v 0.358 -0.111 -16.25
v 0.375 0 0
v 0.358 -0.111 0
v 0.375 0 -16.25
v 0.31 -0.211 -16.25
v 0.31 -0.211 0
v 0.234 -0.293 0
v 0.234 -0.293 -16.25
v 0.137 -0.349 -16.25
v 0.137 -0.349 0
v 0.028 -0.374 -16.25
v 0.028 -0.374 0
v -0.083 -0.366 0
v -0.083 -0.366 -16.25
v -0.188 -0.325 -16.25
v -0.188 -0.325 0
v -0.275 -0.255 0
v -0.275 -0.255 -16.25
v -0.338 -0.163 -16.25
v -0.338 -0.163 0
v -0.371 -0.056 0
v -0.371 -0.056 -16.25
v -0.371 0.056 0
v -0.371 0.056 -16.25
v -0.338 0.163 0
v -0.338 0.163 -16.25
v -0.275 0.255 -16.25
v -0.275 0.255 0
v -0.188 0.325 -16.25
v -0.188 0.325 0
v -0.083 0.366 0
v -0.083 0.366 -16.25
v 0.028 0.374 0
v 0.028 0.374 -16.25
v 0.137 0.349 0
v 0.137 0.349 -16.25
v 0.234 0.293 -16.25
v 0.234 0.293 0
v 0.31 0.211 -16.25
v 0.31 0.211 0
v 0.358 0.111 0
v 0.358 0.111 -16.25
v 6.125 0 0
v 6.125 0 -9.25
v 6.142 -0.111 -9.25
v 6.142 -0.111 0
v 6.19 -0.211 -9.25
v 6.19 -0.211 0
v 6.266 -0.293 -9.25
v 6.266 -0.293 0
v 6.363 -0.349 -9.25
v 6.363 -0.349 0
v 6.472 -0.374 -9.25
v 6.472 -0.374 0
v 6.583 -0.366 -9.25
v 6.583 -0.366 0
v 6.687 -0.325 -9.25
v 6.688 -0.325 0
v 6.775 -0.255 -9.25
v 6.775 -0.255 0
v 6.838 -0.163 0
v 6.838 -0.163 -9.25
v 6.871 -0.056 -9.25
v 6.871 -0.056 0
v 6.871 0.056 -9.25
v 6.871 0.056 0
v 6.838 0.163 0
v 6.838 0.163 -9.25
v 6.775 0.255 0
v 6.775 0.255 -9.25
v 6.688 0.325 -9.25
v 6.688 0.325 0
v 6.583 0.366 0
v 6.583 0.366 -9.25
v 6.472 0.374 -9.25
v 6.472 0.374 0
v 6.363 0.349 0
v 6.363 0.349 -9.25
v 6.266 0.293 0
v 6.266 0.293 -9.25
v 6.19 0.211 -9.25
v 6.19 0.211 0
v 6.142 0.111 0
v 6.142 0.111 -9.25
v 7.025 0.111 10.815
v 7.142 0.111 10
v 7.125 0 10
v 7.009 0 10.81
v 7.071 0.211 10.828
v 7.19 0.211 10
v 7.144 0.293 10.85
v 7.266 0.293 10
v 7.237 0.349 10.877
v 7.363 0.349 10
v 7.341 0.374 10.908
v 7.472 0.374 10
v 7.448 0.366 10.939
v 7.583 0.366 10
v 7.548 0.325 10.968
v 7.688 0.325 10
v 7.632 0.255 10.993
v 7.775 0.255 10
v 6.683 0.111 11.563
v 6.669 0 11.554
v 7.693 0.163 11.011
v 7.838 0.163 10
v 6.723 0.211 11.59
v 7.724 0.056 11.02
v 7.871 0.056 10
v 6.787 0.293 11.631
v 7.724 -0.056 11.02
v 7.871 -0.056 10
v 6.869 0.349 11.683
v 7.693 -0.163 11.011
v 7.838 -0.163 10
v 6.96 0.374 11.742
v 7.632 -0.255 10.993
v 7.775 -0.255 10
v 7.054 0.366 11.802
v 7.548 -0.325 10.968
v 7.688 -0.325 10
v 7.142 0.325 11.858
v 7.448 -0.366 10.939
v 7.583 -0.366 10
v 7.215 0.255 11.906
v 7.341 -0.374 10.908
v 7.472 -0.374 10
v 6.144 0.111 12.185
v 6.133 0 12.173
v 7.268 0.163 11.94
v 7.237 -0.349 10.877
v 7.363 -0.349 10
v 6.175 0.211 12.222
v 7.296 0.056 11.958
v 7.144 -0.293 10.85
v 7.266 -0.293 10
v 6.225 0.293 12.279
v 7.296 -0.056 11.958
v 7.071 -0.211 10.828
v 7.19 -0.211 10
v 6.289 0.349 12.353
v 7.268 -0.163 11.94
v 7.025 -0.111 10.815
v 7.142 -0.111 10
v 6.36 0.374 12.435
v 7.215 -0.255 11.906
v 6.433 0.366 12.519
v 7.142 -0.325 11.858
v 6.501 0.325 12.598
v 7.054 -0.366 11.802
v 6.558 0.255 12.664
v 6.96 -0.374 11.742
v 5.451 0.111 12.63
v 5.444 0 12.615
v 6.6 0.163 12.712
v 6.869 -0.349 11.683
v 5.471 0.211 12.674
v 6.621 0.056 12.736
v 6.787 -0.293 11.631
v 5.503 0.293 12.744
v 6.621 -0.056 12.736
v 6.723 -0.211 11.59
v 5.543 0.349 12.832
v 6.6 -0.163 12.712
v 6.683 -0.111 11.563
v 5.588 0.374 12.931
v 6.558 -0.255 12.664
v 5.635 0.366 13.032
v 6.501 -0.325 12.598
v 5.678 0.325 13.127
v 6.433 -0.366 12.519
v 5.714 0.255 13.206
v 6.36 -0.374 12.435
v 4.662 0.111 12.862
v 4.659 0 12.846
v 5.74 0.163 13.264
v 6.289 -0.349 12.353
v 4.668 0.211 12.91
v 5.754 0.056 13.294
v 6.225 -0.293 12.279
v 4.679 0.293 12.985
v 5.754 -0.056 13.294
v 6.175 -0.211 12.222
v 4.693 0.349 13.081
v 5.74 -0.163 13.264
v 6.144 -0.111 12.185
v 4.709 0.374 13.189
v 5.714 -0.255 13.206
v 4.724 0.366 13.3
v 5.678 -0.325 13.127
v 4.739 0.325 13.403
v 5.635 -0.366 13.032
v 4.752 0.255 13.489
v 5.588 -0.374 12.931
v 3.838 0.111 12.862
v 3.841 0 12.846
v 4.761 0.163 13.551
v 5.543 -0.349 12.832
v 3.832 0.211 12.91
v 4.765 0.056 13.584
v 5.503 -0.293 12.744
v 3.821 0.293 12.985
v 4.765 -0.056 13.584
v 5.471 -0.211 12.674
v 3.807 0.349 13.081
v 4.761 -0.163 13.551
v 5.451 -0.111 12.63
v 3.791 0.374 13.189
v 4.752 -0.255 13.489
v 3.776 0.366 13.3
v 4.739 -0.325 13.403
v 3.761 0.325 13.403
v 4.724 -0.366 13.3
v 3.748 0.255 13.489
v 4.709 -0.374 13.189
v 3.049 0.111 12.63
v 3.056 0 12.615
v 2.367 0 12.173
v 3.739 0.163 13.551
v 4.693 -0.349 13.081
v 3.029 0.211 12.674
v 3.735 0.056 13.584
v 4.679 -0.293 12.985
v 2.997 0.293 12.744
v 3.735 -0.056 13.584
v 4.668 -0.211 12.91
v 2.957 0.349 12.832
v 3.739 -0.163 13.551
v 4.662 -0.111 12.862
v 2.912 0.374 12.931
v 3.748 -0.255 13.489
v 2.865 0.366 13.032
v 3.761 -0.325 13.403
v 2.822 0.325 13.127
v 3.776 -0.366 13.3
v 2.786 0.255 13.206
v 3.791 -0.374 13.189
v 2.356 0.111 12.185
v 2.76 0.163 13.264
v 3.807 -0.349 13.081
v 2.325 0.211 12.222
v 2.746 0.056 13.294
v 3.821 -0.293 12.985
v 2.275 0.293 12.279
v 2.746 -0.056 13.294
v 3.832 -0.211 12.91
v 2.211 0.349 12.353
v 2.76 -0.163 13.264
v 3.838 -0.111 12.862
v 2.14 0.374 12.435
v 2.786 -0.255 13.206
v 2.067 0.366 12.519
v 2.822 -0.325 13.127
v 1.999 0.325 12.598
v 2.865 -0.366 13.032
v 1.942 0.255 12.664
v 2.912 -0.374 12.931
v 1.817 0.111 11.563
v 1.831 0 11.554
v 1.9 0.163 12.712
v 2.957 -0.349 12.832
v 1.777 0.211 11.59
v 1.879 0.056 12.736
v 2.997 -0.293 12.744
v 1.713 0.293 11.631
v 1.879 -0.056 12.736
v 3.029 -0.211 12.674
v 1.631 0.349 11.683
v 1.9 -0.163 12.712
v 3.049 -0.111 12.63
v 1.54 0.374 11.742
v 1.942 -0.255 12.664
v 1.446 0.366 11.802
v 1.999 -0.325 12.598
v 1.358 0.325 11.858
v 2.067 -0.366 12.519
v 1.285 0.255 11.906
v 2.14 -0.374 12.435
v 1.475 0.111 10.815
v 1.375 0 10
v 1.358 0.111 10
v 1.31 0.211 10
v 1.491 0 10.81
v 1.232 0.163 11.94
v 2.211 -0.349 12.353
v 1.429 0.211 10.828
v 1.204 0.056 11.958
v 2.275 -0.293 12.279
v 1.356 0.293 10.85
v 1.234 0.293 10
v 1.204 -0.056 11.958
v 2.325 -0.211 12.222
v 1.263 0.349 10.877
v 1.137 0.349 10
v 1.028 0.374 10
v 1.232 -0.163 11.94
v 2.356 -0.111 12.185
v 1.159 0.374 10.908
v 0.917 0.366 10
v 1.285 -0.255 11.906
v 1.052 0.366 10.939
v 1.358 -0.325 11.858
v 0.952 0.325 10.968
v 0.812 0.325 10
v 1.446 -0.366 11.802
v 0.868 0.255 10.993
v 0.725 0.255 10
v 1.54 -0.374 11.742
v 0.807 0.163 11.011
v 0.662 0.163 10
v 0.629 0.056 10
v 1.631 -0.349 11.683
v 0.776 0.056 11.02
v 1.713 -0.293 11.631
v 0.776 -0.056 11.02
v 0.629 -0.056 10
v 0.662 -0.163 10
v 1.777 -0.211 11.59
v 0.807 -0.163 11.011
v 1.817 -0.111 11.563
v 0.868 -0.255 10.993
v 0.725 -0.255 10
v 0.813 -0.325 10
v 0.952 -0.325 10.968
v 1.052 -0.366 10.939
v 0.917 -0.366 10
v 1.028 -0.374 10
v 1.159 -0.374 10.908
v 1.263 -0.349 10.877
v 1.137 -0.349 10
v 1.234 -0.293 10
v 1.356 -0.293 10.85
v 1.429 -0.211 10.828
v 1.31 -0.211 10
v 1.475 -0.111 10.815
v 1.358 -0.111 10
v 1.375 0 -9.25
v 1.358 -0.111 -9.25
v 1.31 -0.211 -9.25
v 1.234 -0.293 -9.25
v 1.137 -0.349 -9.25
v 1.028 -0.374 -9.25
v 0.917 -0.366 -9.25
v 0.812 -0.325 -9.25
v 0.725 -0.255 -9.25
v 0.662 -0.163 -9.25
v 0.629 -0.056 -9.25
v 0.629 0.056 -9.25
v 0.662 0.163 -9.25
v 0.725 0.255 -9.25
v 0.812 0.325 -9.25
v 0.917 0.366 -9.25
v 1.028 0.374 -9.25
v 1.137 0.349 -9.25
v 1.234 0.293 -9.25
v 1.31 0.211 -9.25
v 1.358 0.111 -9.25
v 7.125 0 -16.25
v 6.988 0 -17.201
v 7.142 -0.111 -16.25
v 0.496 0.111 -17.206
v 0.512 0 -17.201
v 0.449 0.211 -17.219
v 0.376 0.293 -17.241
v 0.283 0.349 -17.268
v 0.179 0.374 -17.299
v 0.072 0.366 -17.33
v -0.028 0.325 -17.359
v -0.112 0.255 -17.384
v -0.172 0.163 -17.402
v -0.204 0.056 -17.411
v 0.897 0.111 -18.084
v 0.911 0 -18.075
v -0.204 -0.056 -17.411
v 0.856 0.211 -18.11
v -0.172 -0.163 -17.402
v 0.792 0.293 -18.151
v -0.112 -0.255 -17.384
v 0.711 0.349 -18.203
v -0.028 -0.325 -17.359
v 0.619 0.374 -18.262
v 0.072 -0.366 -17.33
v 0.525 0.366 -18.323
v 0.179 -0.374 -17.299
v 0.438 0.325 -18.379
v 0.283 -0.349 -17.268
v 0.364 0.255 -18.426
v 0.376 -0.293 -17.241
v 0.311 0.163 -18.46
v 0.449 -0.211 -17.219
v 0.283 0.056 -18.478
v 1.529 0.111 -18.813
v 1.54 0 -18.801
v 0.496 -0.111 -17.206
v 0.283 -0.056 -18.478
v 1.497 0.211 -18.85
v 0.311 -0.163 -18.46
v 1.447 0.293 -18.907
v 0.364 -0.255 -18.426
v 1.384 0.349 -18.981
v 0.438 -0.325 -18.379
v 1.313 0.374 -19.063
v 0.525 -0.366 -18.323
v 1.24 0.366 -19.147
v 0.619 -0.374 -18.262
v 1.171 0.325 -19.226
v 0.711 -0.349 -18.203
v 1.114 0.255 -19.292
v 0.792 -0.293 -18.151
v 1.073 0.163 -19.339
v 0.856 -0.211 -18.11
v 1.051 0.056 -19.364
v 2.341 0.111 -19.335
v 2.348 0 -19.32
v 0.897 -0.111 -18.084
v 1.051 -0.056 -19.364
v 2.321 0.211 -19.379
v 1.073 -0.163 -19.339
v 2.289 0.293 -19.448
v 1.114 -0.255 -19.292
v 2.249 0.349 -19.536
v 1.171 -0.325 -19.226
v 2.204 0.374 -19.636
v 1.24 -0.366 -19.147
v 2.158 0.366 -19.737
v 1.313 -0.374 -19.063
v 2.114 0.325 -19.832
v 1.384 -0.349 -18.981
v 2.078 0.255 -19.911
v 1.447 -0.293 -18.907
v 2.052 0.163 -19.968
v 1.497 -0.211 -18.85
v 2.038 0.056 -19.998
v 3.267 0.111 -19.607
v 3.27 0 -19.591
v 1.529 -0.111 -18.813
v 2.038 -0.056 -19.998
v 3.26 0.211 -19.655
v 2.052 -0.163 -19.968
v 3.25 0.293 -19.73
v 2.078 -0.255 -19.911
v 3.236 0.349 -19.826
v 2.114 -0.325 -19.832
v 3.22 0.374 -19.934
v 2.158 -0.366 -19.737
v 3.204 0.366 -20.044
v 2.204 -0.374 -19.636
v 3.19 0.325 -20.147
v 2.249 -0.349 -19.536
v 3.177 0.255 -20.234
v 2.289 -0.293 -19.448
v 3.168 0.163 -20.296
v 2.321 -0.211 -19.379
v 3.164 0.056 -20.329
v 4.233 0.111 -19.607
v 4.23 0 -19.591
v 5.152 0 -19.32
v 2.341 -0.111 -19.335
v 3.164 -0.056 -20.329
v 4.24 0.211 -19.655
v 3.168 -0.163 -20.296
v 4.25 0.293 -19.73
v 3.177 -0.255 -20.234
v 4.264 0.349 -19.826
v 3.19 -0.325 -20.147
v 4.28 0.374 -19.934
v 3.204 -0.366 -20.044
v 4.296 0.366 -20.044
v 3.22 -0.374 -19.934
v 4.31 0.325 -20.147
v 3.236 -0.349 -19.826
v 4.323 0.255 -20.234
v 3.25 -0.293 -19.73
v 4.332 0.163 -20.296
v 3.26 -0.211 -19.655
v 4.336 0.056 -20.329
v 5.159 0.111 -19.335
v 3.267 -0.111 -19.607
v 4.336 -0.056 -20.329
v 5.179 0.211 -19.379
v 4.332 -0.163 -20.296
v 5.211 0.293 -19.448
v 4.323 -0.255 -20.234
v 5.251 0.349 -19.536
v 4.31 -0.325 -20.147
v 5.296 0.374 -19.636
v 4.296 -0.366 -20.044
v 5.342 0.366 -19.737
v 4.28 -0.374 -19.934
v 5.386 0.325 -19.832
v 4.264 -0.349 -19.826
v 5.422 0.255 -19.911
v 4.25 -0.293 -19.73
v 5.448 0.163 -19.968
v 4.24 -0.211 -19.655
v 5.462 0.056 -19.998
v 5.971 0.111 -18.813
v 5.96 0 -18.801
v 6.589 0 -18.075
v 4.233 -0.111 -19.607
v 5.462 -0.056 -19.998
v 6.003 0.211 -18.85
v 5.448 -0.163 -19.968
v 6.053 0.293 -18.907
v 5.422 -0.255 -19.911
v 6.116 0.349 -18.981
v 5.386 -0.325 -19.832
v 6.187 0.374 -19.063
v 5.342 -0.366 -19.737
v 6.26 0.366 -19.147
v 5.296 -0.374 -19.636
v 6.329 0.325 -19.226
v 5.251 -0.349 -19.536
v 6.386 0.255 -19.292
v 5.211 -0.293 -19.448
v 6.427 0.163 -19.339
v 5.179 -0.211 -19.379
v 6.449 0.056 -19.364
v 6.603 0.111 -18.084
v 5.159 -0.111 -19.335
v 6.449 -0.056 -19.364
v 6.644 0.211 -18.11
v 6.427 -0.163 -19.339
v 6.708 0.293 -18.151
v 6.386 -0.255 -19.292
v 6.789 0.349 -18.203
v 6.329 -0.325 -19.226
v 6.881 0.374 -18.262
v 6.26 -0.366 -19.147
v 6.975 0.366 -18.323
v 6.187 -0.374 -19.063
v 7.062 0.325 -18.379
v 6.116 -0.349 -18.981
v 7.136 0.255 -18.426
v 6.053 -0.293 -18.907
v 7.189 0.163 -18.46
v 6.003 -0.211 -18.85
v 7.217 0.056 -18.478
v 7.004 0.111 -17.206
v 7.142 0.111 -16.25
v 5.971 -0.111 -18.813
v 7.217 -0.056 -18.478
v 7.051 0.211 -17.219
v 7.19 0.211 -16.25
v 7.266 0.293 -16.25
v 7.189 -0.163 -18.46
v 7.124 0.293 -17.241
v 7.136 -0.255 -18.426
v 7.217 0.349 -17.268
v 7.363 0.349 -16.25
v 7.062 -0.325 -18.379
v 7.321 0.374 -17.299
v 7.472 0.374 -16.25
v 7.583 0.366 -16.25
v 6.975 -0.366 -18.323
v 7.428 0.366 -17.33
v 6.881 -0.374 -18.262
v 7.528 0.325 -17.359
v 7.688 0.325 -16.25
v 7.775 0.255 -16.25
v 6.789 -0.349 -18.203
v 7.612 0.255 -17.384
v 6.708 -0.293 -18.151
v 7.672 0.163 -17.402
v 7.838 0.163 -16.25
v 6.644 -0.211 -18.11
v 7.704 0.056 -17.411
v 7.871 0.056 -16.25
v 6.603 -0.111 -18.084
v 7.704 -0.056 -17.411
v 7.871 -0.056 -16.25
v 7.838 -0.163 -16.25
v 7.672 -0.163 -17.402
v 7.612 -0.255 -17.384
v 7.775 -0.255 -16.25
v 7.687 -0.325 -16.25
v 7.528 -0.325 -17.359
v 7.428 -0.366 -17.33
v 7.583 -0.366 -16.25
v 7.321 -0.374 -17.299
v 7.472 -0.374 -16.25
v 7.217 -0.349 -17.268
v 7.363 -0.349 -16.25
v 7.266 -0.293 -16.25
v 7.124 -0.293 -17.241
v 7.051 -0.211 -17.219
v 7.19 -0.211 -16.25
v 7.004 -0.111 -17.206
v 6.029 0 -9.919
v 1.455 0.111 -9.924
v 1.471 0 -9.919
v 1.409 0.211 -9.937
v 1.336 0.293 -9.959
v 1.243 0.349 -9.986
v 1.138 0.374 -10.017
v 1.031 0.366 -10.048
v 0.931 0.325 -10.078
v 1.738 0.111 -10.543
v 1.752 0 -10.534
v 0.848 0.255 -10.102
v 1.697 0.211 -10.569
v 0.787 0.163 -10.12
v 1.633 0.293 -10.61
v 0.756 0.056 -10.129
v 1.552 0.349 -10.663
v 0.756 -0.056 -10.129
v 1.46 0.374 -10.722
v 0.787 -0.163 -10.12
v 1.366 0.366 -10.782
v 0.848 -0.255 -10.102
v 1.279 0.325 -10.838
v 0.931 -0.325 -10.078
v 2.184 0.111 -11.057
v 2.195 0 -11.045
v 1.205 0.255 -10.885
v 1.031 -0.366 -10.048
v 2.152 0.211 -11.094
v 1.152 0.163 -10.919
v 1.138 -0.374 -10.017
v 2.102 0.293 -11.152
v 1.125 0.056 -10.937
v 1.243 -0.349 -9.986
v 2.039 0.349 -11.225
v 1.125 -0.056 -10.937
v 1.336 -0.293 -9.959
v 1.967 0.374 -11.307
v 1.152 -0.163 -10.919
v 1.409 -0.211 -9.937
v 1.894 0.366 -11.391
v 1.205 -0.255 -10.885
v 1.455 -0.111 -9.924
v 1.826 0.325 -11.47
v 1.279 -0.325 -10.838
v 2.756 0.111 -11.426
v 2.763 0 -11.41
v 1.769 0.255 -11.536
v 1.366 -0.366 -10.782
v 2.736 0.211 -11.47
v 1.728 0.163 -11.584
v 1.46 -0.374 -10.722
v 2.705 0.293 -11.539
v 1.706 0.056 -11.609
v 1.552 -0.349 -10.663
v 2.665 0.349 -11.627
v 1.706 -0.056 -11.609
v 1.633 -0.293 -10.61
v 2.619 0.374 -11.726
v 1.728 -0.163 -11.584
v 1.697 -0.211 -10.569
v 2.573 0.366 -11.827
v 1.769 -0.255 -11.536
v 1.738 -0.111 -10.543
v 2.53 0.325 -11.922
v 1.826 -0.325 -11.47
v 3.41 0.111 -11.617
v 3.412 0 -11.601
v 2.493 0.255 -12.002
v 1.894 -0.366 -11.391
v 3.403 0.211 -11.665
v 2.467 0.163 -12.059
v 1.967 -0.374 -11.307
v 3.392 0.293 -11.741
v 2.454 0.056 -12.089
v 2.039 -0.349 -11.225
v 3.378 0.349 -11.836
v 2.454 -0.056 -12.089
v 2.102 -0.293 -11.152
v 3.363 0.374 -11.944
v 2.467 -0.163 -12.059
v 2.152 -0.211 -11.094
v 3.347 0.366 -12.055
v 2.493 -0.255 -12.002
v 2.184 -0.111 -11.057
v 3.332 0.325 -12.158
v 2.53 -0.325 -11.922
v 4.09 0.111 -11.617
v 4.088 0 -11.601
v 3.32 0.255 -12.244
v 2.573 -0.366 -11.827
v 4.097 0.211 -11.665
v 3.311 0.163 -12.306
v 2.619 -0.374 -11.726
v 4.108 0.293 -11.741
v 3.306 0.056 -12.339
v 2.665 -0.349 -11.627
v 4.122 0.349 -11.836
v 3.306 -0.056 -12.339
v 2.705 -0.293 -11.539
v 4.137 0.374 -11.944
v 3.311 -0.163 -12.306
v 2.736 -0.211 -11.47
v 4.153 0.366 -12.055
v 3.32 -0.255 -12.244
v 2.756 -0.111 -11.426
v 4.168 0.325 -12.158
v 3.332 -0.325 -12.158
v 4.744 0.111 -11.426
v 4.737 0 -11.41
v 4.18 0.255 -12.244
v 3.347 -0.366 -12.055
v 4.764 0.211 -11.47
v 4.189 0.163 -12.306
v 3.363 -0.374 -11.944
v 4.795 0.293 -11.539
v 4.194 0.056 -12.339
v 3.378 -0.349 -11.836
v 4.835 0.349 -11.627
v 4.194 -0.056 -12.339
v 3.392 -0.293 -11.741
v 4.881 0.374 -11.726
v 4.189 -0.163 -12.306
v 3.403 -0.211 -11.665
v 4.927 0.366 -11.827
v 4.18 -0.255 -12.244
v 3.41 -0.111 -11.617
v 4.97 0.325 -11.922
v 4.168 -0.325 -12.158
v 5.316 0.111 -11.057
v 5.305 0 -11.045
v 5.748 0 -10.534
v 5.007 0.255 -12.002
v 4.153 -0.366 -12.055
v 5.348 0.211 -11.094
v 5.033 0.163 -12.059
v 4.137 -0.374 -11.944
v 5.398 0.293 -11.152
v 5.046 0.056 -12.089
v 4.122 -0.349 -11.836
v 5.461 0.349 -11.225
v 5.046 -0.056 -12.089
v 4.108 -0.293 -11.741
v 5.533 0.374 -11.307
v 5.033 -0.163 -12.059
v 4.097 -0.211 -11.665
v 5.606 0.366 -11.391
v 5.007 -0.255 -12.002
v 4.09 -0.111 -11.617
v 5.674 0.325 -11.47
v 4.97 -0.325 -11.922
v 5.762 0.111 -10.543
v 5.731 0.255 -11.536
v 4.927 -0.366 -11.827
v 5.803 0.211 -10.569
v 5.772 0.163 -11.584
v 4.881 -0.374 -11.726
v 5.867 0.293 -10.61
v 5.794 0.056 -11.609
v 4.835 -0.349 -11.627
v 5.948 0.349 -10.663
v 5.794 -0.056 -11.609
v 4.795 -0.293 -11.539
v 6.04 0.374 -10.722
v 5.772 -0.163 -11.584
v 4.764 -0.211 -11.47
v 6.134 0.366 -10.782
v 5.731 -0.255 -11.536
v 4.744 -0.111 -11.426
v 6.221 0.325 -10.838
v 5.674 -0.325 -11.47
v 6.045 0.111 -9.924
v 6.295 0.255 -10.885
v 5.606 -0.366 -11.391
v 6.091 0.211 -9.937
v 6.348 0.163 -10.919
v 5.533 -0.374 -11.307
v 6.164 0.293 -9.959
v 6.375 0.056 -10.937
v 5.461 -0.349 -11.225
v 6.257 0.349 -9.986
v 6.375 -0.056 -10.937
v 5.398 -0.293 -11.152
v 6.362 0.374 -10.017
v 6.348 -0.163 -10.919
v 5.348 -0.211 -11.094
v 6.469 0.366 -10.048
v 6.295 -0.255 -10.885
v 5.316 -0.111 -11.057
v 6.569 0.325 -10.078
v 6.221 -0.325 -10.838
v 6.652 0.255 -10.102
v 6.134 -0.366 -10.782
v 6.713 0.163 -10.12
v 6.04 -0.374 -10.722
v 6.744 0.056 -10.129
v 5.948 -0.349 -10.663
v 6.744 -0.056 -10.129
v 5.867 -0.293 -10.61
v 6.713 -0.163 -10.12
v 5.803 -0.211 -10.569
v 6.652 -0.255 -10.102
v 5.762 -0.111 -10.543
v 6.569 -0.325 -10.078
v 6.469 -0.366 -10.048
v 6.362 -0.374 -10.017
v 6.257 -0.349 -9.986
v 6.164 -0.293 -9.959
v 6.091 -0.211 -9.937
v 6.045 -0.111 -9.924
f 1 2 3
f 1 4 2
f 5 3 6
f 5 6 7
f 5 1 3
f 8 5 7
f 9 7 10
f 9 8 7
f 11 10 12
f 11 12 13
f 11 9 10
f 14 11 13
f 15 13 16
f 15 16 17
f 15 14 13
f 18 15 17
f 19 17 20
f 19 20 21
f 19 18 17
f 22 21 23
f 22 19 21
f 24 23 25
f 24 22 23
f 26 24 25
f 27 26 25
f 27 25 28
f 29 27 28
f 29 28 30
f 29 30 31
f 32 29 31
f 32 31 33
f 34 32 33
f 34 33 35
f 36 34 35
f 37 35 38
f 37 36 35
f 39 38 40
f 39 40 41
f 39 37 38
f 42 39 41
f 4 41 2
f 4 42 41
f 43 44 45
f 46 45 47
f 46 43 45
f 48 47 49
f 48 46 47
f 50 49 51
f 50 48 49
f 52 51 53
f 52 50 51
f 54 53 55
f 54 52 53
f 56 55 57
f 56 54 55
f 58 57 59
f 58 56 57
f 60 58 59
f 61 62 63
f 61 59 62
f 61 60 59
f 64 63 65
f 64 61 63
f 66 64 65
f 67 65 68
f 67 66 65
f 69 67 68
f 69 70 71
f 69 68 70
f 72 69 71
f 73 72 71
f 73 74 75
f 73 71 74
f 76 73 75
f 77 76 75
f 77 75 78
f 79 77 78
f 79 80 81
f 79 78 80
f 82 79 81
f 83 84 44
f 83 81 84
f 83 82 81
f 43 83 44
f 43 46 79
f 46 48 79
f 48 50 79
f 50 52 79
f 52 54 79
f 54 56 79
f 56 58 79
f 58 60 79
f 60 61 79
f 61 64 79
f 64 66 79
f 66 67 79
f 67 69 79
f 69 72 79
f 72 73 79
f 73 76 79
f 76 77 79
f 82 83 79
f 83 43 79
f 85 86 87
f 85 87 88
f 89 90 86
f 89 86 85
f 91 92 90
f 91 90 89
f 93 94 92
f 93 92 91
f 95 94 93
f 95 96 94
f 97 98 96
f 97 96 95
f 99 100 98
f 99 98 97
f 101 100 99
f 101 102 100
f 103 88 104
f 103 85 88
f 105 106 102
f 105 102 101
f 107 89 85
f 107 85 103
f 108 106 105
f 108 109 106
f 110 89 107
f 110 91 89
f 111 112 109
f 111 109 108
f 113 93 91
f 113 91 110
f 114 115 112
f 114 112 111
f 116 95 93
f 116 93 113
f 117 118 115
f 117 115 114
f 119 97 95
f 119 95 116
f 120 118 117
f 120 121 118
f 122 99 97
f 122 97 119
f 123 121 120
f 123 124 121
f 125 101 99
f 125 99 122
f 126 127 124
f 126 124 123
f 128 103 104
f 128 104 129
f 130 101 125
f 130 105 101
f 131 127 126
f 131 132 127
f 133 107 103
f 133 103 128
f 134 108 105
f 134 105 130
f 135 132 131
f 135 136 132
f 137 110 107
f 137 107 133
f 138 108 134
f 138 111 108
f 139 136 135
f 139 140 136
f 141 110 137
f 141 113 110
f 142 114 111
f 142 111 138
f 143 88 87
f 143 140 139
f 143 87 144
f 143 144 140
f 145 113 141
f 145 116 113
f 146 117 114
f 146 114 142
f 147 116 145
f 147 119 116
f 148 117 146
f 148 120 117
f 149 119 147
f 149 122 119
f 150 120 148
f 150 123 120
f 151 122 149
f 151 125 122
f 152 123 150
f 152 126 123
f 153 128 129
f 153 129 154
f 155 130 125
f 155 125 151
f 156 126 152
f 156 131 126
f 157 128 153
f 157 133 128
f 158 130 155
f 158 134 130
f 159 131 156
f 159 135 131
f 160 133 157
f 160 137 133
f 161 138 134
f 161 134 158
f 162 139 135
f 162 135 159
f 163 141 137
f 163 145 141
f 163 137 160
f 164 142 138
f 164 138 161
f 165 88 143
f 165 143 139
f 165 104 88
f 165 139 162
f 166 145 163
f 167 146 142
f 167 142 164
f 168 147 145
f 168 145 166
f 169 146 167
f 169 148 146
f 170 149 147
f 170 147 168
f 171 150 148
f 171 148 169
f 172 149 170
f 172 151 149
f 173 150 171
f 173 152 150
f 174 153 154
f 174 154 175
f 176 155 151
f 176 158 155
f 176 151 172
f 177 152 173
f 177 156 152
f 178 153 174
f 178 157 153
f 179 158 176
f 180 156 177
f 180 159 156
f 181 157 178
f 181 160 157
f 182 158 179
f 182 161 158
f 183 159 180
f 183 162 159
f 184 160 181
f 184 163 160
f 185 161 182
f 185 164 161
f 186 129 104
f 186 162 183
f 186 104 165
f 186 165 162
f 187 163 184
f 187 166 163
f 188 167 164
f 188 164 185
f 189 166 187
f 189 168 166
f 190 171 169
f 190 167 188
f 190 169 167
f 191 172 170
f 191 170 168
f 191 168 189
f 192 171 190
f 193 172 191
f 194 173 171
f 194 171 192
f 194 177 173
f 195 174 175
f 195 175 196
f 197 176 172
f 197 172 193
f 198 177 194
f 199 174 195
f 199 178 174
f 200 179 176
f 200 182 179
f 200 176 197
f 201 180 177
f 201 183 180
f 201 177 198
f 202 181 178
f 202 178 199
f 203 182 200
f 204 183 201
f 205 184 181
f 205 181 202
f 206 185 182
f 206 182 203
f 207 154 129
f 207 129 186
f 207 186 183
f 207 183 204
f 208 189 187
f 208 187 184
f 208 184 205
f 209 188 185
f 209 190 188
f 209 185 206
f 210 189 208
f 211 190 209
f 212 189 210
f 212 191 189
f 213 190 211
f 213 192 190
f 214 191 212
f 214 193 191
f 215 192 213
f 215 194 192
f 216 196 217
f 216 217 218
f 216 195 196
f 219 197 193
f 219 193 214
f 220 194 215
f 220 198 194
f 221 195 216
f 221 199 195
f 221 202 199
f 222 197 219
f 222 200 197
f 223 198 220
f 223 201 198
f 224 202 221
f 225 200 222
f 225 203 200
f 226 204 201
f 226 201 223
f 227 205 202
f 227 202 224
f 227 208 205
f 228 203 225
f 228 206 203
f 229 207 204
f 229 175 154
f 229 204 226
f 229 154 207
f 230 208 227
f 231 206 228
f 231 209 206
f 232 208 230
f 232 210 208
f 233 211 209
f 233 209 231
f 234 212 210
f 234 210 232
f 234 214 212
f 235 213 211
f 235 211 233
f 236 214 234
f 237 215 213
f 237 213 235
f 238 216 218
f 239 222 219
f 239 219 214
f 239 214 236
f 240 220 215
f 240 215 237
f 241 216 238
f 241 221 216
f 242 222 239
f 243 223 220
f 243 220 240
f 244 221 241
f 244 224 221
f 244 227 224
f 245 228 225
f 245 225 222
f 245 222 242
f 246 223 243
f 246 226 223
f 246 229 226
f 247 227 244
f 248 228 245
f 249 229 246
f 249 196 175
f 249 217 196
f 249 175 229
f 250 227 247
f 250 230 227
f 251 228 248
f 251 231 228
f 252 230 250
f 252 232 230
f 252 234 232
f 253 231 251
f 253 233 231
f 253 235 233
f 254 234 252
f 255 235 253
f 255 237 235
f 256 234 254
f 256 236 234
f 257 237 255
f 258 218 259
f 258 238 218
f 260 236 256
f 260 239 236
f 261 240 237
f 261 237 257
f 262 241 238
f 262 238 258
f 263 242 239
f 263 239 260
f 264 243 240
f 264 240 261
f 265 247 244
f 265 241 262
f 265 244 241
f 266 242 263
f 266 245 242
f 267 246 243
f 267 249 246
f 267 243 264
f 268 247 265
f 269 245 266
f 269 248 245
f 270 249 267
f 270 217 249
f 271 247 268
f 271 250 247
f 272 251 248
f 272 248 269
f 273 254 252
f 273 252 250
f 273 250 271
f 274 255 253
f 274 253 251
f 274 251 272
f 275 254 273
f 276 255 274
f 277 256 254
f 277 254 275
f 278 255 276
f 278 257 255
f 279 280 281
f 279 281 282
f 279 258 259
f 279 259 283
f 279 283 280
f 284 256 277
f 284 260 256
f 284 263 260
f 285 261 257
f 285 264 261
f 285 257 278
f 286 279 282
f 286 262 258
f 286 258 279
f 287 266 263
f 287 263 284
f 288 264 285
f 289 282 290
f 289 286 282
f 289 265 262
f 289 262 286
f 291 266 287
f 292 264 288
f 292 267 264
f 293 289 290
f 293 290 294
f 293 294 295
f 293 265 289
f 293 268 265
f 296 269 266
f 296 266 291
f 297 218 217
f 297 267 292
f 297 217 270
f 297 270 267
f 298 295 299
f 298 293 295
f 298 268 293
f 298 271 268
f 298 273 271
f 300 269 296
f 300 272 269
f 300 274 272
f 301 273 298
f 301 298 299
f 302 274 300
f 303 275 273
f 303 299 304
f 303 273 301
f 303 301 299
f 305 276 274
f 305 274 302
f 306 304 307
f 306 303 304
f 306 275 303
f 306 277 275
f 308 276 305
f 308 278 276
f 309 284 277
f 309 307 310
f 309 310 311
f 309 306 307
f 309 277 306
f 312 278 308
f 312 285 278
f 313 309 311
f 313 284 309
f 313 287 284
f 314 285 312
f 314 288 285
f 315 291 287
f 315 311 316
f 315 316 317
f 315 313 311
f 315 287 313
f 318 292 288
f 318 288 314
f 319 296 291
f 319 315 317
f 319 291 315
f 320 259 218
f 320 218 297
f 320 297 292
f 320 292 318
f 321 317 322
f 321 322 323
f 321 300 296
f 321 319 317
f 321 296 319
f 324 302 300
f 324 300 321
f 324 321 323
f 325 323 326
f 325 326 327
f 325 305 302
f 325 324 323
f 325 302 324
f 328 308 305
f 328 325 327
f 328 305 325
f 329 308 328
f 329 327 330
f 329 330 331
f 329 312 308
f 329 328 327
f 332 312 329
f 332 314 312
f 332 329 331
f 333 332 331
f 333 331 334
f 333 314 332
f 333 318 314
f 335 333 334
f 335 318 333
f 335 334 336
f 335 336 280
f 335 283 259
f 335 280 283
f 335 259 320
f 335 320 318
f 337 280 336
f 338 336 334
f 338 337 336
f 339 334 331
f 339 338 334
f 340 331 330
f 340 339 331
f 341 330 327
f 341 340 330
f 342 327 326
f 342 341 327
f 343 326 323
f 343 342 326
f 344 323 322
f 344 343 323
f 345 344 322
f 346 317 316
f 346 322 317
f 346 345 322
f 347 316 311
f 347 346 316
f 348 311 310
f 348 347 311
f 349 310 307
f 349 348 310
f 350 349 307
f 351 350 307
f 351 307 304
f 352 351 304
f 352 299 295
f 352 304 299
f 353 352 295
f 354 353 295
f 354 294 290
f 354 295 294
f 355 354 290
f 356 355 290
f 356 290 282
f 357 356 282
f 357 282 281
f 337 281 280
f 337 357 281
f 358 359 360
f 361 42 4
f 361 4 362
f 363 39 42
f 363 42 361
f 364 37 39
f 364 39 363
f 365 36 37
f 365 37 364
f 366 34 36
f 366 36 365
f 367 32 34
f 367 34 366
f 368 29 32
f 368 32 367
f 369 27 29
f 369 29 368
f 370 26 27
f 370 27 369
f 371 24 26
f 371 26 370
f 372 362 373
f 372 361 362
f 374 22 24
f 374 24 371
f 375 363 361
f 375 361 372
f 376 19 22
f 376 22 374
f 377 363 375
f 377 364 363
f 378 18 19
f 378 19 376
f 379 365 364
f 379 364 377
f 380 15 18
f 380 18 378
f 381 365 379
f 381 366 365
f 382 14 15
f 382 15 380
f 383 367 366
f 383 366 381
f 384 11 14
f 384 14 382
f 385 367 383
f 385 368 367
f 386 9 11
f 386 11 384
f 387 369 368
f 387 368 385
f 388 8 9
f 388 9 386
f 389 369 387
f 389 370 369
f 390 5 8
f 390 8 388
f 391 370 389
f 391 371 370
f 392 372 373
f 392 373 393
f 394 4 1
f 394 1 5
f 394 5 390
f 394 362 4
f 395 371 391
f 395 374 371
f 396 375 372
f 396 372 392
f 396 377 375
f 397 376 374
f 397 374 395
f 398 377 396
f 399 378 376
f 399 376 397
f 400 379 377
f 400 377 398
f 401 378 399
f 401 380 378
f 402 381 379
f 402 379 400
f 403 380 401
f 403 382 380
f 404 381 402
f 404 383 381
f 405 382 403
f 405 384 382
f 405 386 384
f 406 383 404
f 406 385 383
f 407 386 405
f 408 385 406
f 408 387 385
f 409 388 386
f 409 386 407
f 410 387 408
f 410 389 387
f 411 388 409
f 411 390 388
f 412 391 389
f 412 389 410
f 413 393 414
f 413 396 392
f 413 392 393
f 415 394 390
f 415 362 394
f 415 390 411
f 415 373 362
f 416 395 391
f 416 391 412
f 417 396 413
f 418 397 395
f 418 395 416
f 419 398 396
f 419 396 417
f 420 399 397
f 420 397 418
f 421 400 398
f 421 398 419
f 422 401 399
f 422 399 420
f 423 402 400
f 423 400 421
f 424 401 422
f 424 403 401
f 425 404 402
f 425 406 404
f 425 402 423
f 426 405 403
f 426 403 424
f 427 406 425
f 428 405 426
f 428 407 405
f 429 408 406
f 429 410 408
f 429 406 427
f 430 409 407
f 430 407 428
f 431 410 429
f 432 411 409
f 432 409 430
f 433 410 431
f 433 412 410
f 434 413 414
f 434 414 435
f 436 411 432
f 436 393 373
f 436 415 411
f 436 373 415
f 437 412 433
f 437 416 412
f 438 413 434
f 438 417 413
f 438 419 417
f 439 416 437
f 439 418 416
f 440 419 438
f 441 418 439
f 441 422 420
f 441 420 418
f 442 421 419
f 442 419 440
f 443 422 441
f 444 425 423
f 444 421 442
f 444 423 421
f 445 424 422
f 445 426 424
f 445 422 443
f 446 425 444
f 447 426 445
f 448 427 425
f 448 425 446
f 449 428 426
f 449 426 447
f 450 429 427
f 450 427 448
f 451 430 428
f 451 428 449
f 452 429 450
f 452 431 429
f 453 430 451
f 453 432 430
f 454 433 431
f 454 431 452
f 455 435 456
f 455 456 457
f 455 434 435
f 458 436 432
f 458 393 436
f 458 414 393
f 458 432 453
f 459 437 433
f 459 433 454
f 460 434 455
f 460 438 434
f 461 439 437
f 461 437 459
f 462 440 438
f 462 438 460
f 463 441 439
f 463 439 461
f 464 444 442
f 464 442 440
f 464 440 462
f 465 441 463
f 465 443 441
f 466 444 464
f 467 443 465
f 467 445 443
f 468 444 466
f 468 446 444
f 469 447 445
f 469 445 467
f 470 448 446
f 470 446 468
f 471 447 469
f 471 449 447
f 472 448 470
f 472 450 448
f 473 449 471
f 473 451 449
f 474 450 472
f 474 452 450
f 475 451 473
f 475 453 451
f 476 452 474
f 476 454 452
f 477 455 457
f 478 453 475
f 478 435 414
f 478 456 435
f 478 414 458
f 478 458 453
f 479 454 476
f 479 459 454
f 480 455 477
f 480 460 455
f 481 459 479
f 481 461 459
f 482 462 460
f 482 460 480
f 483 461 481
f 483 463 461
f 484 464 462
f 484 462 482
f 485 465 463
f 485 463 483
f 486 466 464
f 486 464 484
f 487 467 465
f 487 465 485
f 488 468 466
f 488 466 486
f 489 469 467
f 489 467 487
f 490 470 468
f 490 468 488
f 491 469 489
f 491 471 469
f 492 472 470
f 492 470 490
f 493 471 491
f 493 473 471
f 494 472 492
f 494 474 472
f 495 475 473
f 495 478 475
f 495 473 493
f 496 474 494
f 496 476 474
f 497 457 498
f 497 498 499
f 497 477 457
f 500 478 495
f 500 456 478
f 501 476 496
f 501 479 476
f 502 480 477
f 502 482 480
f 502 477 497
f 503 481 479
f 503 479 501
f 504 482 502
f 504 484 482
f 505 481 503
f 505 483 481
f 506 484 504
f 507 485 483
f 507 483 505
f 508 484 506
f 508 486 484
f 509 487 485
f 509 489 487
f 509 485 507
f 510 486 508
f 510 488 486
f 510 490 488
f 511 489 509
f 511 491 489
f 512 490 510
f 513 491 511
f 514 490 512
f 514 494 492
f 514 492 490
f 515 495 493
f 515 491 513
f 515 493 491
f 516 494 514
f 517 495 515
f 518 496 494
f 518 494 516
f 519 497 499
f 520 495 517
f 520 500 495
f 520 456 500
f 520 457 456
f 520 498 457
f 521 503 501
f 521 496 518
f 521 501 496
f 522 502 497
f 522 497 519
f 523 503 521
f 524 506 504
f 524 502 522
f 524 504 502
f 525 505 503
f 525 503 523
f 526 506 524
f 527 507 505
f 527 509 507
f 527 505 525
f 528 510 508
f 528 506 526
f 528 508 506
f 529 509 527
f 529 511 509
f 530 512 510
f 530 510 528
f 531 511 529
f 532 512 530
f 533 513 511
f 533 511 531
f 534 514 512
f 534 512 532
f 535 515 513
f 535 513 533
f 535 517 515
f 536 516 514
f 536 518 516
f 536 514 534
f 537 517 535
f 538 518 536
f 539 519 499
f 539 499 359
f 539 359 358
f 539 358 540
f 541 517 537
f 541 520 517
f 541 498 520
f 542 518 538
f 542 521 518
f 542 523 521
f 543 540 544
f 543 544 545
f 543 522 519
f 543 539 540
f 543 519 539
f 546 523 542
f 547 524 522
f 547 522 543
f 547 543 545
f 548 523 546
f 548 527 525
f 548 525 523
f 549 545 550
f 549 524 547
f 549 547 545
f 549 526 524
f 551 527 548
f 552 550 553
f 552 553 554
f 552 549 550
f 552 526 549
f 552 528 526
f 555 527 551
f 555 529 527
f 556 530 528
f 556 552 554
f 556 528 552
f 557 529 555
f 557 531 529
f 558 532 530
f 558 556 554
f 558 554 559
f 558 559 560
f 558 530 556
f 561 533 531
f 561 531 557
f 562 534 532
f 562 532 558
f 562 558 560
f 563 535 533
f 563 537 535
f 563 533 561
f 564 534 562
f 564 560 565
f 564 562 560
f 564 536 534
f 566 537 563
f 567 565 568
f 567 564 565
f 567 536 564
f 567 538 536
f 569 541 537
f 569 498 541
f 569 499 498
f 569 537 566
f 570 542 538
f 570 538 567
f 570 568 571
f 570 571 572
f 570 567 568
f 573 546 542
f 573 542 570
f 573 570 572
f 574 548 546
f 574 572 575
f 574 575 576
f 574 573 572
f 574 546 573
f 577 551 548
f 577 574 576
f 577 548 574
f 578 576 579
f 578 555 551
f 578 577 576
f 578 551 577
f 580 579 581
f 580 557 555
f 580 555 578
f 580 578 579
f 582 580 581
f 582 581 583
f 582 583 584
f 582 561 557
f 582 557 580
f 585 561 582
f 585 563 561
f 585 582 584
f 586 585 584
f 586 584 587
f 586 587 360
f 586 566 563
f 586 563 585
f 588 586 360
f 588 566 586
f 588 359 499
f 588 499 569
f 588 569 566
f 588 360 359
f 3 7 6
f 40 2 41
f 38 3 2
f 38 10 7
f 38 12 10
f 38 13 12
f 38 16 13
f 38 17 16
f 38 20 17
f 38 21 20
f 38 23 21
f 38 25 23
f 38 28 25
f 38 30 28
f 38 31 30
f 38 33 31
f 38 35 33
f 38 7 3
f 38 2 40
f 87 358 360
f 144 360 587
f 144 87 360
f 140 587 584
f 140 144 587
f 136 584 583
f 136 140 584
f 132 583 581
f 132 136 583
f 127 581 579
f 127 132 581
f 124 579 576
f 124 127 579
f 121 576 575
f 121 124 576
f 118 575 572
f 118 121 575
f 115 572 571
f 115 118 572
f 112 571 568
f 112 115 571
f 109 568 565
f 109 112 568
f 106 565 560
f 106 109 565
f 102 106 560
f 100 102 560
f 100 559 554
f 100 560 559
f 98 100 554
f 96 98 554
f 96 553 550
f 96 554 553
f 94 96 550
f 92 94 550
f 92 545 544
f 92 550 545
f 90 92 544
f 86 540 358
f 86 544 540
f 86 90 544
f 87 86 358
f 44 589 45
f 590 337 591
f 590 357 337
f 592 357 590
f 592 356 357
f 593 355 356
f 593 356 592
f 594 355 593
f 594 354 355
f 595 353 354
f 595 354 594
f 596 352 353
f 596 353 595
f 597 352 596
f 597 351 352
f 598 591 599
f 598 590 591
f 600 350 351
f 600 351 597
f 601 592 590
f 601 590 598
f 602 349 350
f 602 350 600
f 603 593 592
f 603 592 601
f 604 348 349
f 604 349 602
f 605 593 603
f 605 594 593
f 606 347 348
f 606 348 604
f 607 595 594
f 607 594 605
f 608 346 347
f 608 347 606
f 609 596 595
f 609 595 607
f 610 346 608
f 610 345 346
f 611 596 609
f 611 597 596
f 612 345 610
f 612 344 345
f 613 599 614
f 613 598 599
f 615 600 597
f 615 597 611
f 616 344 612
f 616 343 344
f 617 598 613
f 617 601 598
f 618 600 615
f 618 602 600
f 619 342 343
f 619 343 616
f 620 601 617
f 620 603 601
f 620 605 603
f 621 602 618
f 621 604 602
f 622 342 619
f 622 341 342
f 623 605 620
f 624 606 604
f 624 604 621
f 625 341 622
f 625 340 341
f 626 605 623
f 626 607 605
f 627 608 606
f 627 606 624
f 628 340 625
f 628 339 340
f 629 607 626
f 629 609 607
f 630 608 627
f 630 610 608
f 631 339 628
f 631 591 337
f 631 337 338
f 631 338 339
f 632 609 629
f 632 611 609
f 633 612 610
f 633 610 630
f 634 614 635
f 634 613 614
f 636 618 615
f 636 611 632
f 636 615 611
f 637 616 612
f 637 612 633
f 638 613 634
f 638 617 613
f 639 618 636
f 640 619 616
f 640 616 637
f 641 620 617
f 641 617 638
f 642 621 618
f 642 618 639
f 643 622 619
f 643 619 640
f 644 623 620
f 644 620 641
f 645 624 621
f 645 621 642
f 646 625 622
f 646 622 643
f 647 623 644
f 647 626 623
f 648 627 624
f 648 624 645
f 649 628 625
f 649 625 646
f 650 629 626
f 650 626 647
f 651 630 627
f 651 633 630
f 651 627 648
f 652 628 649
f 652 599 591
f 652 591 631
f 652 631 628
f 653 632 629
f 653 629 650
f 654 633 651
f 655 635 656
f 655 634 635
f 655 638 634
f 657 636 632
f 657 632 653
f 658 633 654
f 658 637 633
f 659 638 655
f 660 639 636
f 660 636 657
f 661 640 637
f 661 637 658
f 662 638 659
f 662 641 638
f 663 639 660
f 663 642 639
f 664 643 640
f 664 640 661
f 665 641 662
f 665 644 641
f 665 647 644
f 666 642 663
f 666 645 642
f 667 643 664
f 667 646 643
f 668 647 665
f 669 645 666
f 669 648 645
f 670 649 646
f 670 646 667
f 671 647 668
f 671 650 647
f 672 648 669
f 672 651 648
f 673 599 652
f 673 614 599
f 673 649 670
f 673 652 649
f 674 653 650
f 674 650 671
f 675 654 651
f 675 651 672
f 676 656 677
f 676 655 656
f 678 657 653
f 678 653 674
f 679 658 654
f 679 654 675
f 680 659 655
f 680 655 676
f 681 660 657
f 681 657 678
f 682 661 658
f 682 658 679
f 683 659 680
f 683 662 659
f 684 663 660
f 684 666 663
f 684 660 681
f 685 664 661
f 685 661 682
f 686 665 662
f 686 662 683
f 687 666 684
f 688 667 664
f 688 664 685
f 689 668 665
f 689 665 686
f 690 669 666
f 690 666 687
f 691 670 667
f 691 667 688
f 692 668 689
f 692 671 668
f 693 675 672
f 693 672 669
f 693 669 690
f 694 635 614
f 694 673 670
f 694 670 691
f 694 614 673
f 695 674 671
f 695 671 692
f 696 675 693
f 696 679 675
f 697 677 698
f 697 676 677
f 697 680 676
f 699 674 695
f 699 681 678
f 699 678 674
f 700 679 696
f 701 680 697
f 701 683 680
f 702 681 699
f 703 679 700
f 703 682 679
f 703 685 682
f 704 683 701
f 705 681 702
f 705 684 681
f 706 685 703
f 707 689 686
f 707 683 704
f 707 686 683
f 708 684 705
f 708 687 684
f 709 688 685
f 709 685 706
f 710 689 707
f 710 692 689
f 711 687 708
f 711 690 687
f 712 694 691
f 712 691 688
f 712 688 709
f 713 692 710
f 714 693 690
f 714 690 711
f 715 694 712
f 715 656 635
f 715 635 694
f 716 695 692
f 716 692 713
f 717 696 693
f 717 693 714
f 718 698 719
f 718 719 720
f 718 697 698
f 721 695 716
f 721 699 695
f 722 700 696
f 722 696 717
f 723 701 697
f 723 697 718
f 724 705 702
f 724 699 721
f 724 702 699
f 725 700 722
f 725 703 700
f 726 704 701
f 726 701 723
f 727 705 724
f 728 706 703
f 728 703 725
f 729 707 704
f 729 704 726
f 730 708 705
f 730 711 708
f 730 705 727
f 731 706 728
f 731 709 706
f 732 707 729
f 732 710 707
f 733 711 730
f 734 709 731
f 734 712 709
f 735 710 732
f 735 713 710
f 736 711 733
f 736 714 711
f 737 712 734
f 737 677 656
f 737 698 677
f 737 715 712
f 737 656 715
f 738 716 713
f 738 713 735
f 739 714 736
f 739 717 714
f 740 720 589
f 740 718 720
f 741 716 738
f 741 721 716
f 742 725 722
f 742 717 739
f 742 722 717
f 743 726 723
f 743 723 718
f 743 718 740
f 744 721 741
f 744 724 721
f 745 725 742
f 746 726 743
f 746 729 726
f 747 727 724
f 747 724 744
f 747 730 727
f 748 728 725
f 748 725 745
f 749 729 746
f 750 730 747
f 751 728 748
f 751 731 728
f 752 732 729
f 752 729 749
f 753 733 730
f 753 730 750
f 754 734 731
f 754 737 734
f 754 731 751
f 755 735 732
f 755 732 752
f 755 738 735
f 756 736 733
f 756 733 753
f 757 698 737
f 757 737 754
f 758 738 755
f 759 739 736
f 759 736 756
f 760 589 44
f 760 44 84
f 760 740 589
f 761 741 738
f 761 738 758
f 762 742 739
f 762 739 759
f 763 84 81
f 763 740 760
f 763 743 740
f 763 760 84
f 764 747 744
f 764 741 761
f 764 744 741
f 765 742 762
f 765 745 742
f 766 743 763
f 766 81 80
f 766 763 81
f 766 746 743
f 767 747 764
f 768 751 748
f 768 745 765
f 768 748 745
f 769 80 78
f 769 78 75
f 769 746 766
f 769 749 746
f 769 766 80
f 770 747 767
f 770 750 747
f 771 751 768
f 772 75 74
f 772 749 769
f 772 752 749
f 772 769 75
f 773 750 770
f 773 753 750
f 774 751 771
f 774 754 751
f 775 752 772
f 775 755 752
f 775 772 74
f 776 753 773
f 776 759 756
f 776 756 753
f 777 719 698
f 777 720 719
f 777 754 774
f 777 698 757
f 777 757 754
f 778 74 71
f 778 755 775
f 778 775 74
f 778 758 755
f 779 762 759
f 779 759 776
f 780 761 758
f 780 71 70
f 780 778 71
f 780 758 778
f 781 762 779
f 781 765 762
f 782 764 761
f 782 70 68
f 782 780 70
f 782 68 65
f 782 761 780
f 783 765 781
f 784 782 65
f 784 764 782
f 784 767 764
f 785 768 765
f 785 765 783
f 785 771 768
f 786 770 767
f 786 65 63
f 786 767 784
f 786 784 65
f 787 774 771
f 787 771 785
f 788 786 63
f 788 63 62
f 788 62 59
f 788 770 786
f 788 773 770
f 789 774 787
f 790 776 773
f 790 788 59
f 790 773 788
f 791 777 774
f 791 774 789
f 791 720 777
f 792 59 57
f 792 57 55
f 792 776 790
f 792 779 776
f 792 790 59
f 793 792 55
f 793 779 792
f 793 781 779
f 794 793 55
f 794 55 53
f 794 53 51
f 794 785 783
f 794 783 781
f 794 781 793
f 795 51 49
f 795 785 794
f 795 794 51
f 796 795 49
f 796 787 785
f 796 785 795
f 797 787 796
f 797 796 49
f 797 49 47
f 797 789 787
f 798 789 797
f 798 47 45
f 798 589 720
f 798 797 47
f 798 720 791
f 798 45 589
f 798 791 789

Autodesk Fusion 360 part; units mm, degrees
sketch "Sketch1" plane through (0, 0, 0) normal (0, 1, 0) x (1, 0, 0)
  line L0 (0, 0) -> (0, 16.25)
  line L1 (0, 16.25) -> (7.5, 16.25) construction
  line L2 (7.5, 16.25) -> (7.5, -10)
  line L3 (7.5, -10) -> (1, -10) construction
  line L4 (1, -10) -> (1, 9.25)
  line L5 (1, 9.25) -> (6.5, 9.25) construction
  line L6 (6.5, 9.25) -> (6.5, 0)
  arc A0 (7.5, 16.25) -> (0, 16.25) centre (3.75, 16.25) ccw
  arc A1 (6.5, 9.25) -> (1, 9.25) centre (3.75, 9.25) ccw
  arc A2 (1, -10) -> (7.5, -10) centre (4.25, -10) ccw
  dimension "d1" = 16.25
  dimension "d2" = 7.5
  dimension "d3" = 26.25
  dimension "d4" = 19.25
  dimension "d5" = 5.5
  dimension "d6" = 9.25
sketch "Sketch3" plane through (0, 0, 0) normal (0, 0, 1) x (1, 0, 0)
  circle A0 centre (0, 0) radius 0.375
  dimension "d7" = 0.75
sweep "Sweep1" add profiles "Sketch3" path "Sketch1" along L0 A0 L2 A2 L4 A1 L6 section 1
